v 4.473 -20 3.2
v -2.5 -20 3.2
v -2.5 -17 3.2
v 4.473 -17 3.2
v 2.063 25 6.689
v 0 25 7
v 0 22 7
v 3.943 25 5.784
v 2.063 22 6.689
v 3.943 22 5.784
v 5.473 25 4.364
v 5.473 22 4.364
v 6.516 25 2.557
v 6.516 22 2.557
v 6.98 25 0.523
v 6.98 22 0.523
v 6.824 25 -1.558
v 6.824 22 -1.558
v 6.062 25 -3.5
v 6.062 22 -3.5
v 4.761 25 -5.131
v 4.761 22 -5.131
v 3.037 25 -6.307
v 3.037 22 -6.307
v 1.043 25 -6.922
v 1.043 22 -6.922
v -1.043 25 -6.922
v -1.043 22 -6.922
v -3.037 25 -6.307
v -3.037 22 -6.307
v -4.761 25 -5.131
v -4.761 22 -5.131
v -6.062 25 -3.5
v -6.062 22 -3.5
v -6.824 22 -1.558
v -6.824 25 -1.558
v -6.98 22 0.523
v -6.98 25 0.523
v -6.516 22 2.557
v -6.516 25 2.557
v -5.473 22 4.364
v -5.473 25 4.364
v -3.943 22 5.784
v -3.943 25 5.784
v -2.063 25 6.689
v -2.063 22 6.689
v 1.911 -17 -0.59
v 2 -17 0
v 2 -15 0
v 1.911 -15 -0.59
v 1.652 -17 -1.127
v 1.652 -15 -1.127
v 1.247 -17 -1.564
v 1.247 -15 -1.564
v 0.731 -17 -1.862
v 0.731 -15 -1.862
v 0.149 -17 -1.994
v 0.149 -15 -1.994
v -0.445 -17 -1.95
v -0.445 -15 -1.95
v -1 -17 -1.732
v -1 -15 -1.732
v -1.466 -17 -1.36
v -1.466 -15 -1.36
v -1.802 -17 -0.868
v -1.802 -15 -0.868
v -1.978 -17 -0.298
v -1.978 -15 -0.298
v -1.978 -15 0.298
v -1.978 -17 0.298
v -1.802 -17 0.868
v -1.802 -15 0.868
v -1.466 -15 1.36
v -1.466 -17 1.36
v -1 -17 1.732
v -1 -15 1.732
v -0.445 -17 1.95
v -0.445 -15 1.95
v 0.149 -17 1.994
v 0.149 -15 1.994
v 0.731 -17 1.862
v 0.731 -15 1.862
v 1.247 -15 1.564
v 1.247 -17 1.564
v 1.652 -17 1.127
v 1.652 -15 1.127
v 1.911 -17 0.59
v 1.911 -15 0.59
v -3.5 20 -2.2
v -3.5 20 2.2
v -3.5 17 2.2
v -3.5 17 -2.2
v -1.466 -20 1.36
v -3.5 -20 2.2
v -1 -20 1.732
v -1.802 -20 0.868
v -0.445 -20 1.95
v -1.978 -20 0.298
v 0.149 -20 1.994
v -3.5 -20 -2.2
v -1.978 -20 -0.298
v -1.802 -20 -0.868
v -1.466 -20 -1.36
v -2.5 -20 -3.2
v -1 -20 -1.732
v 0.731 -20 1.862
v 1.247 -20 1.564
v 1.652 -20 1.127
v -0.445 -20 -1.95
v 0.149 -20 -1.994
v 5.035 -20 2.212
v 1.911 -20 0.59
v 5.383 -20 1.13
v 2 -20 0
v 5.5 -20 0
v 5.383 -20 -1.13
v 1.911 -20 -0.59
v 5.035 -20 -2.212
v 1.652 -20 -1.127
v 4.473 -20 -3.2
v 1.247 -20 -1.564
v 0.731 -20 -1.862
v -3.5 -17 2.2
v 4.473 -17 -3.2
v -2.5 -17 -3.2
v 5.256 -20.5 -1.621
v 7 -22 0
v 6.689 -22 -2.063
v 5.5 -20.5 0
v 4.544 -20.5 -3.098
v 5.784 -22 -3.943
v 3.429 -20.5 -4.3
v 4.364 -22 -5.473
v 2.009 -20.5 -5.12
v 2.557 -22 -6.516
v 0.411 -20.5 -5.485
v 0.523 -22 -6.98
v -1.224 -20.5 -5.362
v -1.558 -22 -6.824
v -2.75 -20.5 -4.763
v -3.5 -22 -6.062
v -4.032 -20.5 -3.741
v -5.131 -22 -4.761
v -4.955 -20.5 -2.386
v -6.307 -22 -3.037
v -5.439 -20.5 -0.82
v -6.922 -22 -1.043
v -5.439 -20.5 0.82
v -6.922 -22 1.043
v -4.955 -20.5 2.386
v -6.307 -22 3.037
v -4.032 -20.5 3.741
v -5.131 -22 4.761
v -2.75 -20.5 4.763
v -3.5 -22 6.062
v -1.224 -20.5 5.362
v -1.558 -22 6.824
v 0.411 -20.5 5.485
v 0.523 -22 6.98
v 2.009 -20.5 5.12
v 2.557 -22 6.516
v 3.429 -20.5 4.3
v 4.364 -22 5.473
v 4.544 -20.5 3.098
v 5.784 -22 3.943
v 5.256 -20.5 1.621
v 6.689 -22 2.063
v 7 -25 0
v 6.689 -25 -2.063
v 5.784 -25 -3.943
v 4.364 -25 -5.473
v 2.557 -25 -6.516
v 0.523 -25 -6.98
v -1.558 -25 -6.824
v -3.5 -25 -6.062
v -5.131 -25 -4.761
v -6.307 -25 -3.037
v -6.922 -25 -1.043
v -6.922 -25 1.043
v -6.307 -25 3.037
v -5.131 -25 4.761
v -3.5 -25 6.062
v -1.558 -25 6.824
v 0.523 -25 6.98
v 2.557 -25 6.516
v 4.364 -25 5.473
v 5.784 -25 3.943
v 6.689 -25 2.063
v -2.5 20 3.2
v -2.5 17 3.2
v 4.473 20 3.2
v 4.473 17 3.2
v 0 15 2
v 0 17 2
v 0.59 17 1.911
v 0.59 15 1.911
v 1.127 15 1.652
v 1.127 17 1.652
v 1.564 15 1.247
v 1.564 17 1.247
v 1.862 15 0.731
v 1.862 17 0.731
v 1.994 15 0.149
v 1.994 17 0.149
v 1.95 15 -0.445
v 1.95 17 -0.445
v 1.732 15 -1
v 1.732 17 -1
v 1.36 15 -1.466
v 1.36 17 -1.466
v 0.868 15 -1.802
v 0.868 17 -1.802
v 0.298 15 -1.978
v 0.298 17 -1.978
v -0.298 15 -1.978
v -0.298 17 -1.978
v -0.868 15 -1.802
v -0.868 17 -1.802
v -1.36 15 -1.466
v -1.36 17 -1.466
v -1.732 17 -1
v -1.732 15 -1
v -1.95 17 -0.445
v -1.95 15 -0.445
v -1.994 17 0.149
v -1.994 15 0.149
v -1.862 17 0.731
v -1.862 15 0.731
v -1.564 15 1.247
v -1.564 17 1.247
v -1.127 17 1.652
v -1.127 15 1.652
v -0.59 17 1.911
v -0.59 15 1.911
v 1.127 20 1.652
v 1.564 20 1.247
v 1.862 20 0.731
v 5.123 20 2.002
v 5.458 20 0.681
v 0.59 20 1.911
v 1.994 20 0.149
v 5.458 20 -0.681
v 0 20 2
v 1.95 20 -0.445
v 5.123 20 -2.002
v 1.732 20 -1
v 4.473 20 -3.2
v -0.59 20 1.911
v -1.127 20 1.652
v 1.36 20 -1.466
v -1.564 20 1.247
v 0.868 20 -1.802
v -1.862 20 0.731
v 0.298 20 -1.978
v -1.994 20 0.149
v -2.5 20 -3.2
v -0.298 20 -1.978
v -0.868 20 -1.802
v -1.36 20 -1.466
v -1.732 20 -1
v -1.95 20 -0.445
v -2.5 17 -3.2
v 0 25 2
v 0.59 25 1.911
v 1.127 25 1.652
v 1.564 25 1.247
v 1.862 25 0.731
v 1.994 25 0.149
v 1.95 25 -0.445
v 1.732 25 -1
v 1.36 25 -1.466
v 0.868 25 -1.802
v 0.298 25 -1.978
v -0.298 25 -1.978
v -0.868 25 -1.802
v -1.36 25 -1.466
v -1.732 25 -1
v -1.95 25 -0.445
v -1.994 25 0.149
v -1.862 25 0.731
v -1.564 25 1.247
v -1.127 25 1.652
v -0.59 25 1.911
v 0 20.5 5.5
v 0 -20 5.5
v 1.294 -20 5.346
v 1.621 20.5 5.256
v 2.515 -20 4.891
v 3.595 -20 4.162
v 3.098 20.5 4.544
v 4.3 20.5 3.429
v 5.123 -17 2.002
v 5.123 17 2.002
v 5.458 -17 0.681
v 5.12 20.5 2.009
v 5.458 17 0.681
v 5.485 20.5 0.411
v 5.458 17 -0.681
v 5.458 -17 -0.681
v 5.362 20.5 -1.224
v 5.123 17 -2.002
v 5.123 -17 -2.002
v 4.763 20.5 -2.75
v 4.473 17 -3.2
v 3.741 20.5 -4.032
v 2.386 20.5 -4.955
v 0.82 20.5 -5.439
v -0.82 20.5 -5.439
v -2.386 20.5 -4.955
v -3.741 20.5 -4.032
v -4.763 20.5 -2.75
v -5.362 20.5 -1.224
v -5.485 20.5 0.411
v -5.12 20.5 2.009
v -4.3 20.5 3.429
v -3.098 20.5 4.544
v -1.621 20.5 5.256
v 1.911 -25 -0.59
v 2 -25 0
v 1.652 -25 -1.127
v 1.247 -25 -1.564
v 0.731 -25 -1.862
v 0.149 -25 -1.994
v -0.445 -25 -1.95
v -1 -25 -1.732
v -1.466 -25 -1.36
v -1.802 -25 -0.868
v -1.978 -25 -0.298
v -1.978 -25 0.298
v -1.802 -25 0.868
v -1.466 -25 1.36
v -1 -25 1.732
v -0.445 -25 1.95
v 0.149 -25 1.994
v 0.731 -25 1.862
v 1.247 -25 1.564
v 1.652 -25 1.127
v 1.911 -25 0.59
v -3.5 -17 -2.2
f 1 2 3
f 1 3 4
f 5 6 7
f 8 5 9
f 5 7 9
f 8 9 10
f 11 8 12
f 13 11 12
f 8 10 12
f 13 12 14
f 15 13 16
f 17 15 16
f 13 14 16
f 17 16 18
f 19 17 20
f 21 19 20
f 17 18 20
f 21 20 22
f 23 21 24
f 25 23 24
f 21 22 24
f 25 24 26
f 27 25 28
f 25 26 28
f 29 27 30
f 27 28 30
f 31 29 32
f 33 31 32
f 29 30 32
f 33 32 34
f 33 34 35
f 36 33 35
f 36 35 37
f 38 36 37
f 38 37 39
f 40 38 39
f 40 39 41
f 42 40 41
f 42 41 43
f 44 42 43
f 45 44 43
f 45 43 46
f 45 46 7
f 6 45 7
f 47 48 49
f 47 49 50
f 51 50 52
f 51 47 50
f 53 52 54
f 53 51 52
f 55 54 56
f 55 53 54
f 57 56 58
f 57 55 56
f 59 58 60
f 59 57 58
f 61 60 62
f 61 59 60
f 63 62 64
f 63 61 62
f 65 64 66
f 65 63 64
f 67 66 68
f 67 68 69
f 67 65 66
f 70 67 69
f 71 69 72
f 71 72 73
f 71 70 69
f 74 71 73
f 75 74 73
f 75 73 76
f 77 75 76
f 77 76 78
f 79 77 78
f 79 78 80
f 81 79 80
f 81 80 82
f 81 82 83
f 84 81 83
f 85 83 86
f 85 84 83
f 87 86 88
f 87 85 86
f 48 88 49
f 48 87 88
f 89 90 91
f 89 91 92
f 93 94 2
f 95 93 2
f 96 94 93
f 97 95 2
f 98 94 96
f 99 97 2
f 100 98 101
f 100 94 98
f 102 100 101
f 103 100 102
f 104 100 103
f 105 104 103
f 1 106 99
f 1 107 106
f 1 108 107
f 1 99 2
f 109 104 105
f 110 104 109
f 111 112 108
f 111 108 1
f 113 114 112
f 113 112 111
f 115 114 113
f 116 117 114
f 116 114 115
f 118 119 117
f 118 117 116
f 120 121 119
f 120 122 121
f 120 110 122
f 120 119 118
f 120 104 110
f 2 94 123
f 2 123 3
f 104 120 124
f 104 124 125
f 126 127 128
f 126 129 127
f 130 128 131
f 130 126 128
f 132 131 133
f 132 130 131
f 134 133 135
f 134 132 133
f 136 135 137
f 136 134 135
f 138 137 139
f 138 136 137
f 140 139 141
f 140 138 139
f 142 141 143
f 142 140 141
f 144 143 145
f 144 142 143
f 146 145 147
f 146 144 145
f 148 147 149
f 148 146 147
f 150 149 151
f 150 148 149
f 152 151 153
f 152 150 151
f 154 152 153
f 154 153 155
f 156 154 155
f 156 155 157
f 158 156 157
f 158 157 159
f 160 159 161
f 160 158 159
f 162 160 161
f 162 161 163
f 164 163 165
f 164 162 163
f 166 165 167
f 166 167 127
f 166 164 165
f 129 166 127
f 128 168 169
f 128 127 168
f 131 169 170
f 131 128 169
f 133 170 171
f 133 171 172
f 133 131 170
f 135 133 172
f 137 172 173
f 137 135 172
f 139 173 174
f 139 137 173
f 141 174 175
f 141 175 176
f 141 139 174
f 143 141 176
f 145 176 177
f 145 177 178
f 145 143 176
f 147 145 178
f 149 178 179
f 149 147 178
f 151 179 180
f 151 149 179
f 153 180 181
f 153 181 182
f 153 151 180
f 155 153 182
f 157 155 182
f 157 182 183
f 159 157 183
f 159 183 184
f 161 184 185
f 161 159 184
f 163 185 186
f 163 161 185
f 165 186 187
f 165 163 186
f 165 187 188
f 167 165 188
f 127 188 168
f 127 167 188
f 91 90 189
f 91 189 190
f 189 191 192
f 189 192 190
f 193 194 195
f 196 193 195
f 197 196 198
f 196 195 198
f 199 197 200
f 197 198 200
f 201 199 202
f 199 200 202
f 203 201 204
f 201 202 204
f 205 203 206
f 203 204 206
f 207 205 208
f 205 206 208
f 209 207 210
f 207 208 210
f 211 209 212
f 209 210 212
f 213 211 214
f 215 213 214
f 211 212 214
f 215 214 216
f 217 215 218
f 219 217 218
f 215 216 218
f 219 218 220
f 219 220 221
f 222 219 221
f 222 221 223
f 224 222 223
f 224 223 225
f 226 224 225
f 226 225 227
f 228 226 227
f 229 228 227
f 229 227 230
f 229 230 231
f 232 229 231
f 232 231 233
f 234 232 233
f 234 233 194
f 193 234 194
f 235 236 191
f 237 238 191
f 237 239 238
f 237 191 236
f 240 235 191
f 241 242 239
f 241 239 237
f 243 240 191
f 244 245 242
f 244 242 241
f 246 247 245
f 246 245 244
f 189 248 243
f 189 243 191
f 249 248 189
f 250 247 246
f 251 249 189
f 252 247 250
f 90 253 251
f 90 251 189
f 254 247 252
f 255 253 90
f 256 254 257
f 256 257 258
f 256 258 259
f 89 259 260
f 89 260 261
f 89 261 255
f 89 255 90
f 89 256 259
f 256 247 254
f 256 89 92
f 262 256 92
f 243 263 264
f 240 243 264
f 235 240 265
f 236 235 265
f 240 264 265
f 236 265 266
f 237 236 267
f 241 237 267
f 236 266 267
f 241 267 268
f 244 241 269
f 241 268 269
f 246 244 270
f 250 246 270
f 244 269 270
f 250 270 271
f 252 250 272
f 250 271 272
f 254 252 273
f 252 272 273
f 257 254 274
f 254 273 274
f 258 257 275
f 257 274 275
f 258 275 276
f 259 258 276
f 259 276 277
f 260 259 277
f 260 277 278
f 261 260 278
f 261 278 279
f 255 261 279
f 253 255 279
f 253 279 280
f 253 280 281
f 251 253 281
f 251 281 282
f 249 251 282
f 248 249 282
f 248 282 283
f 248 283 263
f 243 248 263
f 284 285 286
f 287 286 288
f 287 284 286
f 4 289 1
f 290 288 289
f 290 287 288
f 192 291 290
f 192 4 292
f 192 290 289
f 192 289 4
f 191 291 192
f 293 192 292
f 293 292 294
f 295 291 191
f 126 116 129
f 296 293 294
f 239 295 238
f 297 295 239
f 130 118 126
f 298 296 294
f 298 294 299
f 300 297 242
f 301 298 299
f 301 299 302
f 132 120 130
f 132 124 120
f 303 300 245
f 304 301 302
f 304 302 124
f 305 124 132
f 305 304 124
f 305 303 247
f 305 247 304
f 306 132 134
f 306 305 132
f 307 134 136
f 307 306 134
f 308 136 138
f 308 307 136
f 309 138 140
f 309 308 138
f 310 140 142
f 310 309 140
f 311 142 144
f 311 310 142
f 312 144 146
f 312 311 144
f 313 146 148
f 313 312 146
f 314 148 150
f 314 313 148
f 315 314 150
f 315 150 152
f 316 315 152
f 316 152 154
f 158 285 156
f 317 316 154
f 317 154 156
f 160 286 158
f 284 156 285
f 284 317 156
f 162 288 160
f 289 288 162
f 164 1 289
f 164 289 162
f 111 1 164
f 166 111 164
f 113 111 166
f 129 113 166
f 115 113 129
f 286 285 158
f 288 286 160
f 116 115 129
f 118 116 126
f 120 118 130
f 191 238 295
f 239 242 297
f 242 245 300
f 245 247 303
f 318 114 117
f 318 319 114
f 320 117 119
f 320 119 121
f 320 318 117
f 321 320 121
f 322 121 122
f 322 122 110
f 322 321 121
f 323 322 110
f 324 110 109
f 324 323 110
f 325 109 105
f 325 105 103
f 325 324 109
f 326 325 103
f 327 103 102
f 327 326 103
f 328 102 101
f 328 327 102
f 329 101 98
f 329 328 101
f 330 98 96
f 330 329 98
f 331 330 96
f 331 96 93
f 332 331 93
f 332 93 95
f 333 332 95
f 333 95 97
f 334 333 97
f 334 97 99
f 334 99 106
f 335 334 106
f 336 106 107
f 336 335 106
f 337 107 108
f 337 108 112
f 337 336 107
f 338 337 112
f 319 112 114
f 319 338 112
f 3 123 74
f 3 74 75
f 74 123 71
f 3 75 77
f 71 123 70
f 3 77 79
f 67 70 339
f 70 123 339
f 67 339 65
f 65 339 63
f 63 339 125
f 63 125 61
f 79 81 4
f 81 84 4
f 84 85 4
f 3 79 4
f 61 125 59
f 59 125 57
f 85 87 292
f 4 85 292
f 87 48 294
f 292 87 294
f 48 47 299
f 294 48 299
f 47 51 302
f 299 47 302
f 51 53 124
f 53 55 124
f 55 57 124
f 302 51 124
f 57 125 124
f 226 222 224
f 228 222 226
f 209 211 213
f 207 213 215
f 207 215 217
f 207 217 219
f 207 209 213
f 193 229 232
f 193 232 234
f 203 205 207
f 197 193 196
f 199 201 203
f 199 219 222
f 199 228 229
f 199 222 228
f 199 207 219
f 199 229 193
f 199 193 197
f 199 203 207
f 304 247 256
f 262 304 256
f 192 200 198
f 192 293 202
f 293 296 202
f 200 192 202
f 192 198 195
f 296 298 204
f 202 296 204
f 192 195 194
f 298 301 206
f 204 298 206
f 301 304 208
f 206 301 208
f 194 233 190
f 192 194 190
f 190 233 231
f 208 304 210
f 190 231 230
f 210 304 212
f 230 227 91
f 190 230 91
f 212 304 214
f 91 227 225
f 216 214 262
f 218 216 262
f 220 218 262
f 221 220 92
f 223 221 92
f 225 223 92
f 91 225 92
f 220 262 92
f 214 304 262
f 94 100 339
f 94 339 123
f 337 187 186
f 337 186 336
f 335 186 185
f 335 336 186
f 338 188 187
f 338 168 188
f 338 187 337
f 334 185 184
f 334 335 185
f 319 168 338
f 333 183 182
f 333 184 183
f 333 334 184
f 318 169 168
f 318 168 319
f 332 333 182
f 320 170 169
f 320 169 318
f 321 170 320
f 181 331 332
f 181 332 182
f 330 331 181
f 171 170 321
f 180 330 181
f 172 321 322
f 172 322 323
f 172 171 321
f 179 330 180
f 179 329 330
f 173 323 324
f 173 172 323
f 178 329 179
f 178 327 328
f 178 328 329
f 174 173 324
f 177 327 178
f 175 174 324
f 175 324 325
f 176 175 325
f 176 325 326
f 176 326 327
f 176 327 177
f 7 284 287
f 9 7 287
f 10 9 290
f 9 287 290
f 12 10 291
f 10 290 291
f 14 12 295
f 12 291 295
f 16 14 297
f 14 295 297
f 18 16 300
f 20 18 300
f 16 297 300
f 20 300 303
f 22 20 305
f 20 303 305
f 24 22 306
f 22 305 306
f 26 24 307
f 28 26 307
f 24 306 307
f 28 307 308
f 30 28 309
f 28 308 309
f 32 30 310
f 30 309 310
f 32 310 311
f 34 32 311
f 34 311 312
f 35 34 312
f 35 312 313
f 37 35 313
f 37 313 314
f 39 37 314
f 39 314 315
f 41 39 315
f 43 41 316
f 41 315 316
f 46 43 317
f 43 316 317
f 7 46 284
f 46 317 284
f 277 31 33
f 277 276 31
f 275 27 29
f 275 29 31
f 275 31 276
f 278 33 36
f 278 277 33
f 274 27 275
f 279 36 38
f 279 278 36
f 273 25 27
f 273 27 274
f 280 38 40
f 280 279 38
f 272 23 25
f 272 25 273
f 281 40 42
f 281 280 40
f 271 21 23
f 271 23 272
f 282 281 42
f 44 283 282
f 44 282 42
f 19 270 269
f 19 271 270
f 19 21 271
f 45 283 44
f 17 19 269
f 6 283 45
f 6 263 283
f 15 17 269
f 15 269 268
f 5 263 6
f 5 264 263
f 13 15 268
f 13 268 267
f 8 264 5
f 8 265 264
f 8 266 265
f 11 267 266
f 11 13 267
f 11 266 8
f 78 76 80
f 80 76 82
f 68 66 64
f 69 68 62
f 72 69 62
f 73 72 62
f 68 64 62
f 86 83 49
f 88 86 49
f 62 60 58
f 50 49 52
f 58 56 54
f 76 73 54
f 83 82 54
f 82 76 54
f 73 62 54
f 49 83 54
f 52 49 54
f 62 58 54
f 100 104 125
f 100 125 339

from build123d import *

# Parameters (mm, degrees)
SKETCH1_R           = 5.5
BOSS_EXTRUDE1_DEPTH = 20
SKETCH2_R           = 7
BOSS_EXTRUDE2_DEPTH = 5
CHAMFER2_SIZE       = 2
SKETCH3_R           = 2
CUT_EXTRUDE1_DEPTH  = 10
SKETCH6_W           = 14.643635598
SKETCH6_H           = 6.4
CUT_EXTRUDE2_DEPTH  = 3
CHAMFER4_SIZE       = 1
MIRROR4_START       = -20
MIRROR4_2_DEPTH     = 3
MIRROR4_START_2     = -17
MIRROR4_3_OUTLINE_R = 2
MIRROR4_3_DEPTH     = 2


# Read off the part's stored shape, not the designer's step: Mirror4
with BuildPart() as part:
    # Sketch1 → Boss-Extrude1 (new, symmetric)
    with BuildSketch(Plane(origin=(0, 0, 0), x_dir=(1, 0, 0), z_dir=(0, 1, 0))):
        with Locations(Location((0, 0, 0), (0, 0, 270))):
            Circle(SKETCH1_R)
    extrude(amount=BOSS_EXTRUDE1_DEPTH, both=True)

    # Sketch2 → Boss-Extrude2 (add)
    with BuildSketch(Plane(origin=(0, 20, 0), x_dir=(1, 0, 0), z_dir=(0, 1, 0))):
        with Locations(Location((0, 0, 0), (0, 0, 270))):
            Circle(SKETCH2_R)
    extrude(amount=BOSS_EXTRUDE2_DEPTH)

    # Chamfer2
    # the kernel refuses this chamfer: 2 mm, written as the material it takes off along each edge
    with BuildSketch(Plane(origin=(0, 20, 0), x_dir=(0, 0, 1), z_dir=(-1, 0, 0))) as chamfer2_piece_1_section:
        Polygon((7, CHAMFER2_SIZE), (7 - CHAMFER2_SIZE, 0), (7, 0), align=None)
    chamfer2_piece_1 = revolve(axis=Axis((0, 20, 0), (0, 1, 0)), mode=Mode.PRIVATE)
    chamfer2_piece_1 = chamfer2_piece_1 - Plane(origin=(0, 21.24754516, 0), x_dir=(0, 0, 1), z_dir=(0, 1, 0)) * Cylinder(5.5, 28, mode=Mode.PRIVATE)
    add(chamfer2_piece_1, mode=Mode.SUBTRACT)

    # Sketch3 → Cut-Extrude1 (cut)
    with BuildSketch(Plane(origin=(0, 25, 0), x_dir=(1, 0, 0), z_dir=(0, 1, 0))):
        with Locations(Location((0, 0, 0), (0, 0, 270))):
            Circle(SKETCH3_R)
    extrude(amount=-CUT_EXTRUDE1_DEPTH, mode=Mode.SUBTRACT)

    # Sketch6 → Cut-Extrude2 (cut)
    with BuildSketch(Plane(origin=(0, 20, 0), x_dir=(-1, 0, 0), z_dir=(0, -1, 0))):
        with Locations((-3.821817799, 0)):
            Rectangle(SKETCH6_W, SKETCH6_H)
    extrude(amount=CUT_EXTRUDE2_DEPTH, mode=Mode.SUBTRACT)

    # Chamfer4
    chamfer4_edges = [part.edges().sort_by_distance(p)[0] for p in [
        (-3.5, 18.5, -3.2),
        (-3.5, 18.5, 3.2),
    ]]
    chamfer(chamfer4_edges, length=CHAMFER4_SIZE)

    # Mirror4 outline → Mirror4 (revolve)
    with BuildSketch(Plane.XY):
        Polygon((7, -25), (7, -22), (5.5, -20.5), (5.5, -20), (2, -20), (2, -25), align=None)
    revolve(axis=Axis((0, 0, 0), (0, 1, 0)))

    # Mirror4 2 outline → Mirror4 2 (cut)
    with BuildSketch(Plane(origin=(0, 0, 0), x_dir=(1, 0, 0), z_dir=(0, 1, 0)).offset(MIRROR4_START)):
        with BuildLine():
            Line((4.473253849, 3.2), (-2.5, 3.2))
            Line((-2.5, 3.2), (-3.5, 2.2))
            Line((-3.5, 2.2), (-3.5, -2.2))
            Line((-3.5, -2.2), (-2.5, -3.2))
            Line((-2.5, -3.2), (4.473253849, -3.2))
            ThreePointArc((4.473253849, -3.2), (5.5, 0), (4.473253849, 3.2))
        make_face()
    extrude(amount=MIRROR4_2_DEPTH, mode=Mode.SUBTRACT)

    # Mirror4 3 outline → Mirror4 3 (cut)
    with BuildSketch(Plane(origin=(0, 0, 0), x_dir=(1, 0, 0), z_dir=(0, 1, 0)).offset(MIRROR4_START_2)):
        Circle(MIRROR4_3_OUTLINE_R)
    extrude(amount=MIRROR4_3_DEPTH, mode=Mode.SUBTRACT)


solid = part.part
